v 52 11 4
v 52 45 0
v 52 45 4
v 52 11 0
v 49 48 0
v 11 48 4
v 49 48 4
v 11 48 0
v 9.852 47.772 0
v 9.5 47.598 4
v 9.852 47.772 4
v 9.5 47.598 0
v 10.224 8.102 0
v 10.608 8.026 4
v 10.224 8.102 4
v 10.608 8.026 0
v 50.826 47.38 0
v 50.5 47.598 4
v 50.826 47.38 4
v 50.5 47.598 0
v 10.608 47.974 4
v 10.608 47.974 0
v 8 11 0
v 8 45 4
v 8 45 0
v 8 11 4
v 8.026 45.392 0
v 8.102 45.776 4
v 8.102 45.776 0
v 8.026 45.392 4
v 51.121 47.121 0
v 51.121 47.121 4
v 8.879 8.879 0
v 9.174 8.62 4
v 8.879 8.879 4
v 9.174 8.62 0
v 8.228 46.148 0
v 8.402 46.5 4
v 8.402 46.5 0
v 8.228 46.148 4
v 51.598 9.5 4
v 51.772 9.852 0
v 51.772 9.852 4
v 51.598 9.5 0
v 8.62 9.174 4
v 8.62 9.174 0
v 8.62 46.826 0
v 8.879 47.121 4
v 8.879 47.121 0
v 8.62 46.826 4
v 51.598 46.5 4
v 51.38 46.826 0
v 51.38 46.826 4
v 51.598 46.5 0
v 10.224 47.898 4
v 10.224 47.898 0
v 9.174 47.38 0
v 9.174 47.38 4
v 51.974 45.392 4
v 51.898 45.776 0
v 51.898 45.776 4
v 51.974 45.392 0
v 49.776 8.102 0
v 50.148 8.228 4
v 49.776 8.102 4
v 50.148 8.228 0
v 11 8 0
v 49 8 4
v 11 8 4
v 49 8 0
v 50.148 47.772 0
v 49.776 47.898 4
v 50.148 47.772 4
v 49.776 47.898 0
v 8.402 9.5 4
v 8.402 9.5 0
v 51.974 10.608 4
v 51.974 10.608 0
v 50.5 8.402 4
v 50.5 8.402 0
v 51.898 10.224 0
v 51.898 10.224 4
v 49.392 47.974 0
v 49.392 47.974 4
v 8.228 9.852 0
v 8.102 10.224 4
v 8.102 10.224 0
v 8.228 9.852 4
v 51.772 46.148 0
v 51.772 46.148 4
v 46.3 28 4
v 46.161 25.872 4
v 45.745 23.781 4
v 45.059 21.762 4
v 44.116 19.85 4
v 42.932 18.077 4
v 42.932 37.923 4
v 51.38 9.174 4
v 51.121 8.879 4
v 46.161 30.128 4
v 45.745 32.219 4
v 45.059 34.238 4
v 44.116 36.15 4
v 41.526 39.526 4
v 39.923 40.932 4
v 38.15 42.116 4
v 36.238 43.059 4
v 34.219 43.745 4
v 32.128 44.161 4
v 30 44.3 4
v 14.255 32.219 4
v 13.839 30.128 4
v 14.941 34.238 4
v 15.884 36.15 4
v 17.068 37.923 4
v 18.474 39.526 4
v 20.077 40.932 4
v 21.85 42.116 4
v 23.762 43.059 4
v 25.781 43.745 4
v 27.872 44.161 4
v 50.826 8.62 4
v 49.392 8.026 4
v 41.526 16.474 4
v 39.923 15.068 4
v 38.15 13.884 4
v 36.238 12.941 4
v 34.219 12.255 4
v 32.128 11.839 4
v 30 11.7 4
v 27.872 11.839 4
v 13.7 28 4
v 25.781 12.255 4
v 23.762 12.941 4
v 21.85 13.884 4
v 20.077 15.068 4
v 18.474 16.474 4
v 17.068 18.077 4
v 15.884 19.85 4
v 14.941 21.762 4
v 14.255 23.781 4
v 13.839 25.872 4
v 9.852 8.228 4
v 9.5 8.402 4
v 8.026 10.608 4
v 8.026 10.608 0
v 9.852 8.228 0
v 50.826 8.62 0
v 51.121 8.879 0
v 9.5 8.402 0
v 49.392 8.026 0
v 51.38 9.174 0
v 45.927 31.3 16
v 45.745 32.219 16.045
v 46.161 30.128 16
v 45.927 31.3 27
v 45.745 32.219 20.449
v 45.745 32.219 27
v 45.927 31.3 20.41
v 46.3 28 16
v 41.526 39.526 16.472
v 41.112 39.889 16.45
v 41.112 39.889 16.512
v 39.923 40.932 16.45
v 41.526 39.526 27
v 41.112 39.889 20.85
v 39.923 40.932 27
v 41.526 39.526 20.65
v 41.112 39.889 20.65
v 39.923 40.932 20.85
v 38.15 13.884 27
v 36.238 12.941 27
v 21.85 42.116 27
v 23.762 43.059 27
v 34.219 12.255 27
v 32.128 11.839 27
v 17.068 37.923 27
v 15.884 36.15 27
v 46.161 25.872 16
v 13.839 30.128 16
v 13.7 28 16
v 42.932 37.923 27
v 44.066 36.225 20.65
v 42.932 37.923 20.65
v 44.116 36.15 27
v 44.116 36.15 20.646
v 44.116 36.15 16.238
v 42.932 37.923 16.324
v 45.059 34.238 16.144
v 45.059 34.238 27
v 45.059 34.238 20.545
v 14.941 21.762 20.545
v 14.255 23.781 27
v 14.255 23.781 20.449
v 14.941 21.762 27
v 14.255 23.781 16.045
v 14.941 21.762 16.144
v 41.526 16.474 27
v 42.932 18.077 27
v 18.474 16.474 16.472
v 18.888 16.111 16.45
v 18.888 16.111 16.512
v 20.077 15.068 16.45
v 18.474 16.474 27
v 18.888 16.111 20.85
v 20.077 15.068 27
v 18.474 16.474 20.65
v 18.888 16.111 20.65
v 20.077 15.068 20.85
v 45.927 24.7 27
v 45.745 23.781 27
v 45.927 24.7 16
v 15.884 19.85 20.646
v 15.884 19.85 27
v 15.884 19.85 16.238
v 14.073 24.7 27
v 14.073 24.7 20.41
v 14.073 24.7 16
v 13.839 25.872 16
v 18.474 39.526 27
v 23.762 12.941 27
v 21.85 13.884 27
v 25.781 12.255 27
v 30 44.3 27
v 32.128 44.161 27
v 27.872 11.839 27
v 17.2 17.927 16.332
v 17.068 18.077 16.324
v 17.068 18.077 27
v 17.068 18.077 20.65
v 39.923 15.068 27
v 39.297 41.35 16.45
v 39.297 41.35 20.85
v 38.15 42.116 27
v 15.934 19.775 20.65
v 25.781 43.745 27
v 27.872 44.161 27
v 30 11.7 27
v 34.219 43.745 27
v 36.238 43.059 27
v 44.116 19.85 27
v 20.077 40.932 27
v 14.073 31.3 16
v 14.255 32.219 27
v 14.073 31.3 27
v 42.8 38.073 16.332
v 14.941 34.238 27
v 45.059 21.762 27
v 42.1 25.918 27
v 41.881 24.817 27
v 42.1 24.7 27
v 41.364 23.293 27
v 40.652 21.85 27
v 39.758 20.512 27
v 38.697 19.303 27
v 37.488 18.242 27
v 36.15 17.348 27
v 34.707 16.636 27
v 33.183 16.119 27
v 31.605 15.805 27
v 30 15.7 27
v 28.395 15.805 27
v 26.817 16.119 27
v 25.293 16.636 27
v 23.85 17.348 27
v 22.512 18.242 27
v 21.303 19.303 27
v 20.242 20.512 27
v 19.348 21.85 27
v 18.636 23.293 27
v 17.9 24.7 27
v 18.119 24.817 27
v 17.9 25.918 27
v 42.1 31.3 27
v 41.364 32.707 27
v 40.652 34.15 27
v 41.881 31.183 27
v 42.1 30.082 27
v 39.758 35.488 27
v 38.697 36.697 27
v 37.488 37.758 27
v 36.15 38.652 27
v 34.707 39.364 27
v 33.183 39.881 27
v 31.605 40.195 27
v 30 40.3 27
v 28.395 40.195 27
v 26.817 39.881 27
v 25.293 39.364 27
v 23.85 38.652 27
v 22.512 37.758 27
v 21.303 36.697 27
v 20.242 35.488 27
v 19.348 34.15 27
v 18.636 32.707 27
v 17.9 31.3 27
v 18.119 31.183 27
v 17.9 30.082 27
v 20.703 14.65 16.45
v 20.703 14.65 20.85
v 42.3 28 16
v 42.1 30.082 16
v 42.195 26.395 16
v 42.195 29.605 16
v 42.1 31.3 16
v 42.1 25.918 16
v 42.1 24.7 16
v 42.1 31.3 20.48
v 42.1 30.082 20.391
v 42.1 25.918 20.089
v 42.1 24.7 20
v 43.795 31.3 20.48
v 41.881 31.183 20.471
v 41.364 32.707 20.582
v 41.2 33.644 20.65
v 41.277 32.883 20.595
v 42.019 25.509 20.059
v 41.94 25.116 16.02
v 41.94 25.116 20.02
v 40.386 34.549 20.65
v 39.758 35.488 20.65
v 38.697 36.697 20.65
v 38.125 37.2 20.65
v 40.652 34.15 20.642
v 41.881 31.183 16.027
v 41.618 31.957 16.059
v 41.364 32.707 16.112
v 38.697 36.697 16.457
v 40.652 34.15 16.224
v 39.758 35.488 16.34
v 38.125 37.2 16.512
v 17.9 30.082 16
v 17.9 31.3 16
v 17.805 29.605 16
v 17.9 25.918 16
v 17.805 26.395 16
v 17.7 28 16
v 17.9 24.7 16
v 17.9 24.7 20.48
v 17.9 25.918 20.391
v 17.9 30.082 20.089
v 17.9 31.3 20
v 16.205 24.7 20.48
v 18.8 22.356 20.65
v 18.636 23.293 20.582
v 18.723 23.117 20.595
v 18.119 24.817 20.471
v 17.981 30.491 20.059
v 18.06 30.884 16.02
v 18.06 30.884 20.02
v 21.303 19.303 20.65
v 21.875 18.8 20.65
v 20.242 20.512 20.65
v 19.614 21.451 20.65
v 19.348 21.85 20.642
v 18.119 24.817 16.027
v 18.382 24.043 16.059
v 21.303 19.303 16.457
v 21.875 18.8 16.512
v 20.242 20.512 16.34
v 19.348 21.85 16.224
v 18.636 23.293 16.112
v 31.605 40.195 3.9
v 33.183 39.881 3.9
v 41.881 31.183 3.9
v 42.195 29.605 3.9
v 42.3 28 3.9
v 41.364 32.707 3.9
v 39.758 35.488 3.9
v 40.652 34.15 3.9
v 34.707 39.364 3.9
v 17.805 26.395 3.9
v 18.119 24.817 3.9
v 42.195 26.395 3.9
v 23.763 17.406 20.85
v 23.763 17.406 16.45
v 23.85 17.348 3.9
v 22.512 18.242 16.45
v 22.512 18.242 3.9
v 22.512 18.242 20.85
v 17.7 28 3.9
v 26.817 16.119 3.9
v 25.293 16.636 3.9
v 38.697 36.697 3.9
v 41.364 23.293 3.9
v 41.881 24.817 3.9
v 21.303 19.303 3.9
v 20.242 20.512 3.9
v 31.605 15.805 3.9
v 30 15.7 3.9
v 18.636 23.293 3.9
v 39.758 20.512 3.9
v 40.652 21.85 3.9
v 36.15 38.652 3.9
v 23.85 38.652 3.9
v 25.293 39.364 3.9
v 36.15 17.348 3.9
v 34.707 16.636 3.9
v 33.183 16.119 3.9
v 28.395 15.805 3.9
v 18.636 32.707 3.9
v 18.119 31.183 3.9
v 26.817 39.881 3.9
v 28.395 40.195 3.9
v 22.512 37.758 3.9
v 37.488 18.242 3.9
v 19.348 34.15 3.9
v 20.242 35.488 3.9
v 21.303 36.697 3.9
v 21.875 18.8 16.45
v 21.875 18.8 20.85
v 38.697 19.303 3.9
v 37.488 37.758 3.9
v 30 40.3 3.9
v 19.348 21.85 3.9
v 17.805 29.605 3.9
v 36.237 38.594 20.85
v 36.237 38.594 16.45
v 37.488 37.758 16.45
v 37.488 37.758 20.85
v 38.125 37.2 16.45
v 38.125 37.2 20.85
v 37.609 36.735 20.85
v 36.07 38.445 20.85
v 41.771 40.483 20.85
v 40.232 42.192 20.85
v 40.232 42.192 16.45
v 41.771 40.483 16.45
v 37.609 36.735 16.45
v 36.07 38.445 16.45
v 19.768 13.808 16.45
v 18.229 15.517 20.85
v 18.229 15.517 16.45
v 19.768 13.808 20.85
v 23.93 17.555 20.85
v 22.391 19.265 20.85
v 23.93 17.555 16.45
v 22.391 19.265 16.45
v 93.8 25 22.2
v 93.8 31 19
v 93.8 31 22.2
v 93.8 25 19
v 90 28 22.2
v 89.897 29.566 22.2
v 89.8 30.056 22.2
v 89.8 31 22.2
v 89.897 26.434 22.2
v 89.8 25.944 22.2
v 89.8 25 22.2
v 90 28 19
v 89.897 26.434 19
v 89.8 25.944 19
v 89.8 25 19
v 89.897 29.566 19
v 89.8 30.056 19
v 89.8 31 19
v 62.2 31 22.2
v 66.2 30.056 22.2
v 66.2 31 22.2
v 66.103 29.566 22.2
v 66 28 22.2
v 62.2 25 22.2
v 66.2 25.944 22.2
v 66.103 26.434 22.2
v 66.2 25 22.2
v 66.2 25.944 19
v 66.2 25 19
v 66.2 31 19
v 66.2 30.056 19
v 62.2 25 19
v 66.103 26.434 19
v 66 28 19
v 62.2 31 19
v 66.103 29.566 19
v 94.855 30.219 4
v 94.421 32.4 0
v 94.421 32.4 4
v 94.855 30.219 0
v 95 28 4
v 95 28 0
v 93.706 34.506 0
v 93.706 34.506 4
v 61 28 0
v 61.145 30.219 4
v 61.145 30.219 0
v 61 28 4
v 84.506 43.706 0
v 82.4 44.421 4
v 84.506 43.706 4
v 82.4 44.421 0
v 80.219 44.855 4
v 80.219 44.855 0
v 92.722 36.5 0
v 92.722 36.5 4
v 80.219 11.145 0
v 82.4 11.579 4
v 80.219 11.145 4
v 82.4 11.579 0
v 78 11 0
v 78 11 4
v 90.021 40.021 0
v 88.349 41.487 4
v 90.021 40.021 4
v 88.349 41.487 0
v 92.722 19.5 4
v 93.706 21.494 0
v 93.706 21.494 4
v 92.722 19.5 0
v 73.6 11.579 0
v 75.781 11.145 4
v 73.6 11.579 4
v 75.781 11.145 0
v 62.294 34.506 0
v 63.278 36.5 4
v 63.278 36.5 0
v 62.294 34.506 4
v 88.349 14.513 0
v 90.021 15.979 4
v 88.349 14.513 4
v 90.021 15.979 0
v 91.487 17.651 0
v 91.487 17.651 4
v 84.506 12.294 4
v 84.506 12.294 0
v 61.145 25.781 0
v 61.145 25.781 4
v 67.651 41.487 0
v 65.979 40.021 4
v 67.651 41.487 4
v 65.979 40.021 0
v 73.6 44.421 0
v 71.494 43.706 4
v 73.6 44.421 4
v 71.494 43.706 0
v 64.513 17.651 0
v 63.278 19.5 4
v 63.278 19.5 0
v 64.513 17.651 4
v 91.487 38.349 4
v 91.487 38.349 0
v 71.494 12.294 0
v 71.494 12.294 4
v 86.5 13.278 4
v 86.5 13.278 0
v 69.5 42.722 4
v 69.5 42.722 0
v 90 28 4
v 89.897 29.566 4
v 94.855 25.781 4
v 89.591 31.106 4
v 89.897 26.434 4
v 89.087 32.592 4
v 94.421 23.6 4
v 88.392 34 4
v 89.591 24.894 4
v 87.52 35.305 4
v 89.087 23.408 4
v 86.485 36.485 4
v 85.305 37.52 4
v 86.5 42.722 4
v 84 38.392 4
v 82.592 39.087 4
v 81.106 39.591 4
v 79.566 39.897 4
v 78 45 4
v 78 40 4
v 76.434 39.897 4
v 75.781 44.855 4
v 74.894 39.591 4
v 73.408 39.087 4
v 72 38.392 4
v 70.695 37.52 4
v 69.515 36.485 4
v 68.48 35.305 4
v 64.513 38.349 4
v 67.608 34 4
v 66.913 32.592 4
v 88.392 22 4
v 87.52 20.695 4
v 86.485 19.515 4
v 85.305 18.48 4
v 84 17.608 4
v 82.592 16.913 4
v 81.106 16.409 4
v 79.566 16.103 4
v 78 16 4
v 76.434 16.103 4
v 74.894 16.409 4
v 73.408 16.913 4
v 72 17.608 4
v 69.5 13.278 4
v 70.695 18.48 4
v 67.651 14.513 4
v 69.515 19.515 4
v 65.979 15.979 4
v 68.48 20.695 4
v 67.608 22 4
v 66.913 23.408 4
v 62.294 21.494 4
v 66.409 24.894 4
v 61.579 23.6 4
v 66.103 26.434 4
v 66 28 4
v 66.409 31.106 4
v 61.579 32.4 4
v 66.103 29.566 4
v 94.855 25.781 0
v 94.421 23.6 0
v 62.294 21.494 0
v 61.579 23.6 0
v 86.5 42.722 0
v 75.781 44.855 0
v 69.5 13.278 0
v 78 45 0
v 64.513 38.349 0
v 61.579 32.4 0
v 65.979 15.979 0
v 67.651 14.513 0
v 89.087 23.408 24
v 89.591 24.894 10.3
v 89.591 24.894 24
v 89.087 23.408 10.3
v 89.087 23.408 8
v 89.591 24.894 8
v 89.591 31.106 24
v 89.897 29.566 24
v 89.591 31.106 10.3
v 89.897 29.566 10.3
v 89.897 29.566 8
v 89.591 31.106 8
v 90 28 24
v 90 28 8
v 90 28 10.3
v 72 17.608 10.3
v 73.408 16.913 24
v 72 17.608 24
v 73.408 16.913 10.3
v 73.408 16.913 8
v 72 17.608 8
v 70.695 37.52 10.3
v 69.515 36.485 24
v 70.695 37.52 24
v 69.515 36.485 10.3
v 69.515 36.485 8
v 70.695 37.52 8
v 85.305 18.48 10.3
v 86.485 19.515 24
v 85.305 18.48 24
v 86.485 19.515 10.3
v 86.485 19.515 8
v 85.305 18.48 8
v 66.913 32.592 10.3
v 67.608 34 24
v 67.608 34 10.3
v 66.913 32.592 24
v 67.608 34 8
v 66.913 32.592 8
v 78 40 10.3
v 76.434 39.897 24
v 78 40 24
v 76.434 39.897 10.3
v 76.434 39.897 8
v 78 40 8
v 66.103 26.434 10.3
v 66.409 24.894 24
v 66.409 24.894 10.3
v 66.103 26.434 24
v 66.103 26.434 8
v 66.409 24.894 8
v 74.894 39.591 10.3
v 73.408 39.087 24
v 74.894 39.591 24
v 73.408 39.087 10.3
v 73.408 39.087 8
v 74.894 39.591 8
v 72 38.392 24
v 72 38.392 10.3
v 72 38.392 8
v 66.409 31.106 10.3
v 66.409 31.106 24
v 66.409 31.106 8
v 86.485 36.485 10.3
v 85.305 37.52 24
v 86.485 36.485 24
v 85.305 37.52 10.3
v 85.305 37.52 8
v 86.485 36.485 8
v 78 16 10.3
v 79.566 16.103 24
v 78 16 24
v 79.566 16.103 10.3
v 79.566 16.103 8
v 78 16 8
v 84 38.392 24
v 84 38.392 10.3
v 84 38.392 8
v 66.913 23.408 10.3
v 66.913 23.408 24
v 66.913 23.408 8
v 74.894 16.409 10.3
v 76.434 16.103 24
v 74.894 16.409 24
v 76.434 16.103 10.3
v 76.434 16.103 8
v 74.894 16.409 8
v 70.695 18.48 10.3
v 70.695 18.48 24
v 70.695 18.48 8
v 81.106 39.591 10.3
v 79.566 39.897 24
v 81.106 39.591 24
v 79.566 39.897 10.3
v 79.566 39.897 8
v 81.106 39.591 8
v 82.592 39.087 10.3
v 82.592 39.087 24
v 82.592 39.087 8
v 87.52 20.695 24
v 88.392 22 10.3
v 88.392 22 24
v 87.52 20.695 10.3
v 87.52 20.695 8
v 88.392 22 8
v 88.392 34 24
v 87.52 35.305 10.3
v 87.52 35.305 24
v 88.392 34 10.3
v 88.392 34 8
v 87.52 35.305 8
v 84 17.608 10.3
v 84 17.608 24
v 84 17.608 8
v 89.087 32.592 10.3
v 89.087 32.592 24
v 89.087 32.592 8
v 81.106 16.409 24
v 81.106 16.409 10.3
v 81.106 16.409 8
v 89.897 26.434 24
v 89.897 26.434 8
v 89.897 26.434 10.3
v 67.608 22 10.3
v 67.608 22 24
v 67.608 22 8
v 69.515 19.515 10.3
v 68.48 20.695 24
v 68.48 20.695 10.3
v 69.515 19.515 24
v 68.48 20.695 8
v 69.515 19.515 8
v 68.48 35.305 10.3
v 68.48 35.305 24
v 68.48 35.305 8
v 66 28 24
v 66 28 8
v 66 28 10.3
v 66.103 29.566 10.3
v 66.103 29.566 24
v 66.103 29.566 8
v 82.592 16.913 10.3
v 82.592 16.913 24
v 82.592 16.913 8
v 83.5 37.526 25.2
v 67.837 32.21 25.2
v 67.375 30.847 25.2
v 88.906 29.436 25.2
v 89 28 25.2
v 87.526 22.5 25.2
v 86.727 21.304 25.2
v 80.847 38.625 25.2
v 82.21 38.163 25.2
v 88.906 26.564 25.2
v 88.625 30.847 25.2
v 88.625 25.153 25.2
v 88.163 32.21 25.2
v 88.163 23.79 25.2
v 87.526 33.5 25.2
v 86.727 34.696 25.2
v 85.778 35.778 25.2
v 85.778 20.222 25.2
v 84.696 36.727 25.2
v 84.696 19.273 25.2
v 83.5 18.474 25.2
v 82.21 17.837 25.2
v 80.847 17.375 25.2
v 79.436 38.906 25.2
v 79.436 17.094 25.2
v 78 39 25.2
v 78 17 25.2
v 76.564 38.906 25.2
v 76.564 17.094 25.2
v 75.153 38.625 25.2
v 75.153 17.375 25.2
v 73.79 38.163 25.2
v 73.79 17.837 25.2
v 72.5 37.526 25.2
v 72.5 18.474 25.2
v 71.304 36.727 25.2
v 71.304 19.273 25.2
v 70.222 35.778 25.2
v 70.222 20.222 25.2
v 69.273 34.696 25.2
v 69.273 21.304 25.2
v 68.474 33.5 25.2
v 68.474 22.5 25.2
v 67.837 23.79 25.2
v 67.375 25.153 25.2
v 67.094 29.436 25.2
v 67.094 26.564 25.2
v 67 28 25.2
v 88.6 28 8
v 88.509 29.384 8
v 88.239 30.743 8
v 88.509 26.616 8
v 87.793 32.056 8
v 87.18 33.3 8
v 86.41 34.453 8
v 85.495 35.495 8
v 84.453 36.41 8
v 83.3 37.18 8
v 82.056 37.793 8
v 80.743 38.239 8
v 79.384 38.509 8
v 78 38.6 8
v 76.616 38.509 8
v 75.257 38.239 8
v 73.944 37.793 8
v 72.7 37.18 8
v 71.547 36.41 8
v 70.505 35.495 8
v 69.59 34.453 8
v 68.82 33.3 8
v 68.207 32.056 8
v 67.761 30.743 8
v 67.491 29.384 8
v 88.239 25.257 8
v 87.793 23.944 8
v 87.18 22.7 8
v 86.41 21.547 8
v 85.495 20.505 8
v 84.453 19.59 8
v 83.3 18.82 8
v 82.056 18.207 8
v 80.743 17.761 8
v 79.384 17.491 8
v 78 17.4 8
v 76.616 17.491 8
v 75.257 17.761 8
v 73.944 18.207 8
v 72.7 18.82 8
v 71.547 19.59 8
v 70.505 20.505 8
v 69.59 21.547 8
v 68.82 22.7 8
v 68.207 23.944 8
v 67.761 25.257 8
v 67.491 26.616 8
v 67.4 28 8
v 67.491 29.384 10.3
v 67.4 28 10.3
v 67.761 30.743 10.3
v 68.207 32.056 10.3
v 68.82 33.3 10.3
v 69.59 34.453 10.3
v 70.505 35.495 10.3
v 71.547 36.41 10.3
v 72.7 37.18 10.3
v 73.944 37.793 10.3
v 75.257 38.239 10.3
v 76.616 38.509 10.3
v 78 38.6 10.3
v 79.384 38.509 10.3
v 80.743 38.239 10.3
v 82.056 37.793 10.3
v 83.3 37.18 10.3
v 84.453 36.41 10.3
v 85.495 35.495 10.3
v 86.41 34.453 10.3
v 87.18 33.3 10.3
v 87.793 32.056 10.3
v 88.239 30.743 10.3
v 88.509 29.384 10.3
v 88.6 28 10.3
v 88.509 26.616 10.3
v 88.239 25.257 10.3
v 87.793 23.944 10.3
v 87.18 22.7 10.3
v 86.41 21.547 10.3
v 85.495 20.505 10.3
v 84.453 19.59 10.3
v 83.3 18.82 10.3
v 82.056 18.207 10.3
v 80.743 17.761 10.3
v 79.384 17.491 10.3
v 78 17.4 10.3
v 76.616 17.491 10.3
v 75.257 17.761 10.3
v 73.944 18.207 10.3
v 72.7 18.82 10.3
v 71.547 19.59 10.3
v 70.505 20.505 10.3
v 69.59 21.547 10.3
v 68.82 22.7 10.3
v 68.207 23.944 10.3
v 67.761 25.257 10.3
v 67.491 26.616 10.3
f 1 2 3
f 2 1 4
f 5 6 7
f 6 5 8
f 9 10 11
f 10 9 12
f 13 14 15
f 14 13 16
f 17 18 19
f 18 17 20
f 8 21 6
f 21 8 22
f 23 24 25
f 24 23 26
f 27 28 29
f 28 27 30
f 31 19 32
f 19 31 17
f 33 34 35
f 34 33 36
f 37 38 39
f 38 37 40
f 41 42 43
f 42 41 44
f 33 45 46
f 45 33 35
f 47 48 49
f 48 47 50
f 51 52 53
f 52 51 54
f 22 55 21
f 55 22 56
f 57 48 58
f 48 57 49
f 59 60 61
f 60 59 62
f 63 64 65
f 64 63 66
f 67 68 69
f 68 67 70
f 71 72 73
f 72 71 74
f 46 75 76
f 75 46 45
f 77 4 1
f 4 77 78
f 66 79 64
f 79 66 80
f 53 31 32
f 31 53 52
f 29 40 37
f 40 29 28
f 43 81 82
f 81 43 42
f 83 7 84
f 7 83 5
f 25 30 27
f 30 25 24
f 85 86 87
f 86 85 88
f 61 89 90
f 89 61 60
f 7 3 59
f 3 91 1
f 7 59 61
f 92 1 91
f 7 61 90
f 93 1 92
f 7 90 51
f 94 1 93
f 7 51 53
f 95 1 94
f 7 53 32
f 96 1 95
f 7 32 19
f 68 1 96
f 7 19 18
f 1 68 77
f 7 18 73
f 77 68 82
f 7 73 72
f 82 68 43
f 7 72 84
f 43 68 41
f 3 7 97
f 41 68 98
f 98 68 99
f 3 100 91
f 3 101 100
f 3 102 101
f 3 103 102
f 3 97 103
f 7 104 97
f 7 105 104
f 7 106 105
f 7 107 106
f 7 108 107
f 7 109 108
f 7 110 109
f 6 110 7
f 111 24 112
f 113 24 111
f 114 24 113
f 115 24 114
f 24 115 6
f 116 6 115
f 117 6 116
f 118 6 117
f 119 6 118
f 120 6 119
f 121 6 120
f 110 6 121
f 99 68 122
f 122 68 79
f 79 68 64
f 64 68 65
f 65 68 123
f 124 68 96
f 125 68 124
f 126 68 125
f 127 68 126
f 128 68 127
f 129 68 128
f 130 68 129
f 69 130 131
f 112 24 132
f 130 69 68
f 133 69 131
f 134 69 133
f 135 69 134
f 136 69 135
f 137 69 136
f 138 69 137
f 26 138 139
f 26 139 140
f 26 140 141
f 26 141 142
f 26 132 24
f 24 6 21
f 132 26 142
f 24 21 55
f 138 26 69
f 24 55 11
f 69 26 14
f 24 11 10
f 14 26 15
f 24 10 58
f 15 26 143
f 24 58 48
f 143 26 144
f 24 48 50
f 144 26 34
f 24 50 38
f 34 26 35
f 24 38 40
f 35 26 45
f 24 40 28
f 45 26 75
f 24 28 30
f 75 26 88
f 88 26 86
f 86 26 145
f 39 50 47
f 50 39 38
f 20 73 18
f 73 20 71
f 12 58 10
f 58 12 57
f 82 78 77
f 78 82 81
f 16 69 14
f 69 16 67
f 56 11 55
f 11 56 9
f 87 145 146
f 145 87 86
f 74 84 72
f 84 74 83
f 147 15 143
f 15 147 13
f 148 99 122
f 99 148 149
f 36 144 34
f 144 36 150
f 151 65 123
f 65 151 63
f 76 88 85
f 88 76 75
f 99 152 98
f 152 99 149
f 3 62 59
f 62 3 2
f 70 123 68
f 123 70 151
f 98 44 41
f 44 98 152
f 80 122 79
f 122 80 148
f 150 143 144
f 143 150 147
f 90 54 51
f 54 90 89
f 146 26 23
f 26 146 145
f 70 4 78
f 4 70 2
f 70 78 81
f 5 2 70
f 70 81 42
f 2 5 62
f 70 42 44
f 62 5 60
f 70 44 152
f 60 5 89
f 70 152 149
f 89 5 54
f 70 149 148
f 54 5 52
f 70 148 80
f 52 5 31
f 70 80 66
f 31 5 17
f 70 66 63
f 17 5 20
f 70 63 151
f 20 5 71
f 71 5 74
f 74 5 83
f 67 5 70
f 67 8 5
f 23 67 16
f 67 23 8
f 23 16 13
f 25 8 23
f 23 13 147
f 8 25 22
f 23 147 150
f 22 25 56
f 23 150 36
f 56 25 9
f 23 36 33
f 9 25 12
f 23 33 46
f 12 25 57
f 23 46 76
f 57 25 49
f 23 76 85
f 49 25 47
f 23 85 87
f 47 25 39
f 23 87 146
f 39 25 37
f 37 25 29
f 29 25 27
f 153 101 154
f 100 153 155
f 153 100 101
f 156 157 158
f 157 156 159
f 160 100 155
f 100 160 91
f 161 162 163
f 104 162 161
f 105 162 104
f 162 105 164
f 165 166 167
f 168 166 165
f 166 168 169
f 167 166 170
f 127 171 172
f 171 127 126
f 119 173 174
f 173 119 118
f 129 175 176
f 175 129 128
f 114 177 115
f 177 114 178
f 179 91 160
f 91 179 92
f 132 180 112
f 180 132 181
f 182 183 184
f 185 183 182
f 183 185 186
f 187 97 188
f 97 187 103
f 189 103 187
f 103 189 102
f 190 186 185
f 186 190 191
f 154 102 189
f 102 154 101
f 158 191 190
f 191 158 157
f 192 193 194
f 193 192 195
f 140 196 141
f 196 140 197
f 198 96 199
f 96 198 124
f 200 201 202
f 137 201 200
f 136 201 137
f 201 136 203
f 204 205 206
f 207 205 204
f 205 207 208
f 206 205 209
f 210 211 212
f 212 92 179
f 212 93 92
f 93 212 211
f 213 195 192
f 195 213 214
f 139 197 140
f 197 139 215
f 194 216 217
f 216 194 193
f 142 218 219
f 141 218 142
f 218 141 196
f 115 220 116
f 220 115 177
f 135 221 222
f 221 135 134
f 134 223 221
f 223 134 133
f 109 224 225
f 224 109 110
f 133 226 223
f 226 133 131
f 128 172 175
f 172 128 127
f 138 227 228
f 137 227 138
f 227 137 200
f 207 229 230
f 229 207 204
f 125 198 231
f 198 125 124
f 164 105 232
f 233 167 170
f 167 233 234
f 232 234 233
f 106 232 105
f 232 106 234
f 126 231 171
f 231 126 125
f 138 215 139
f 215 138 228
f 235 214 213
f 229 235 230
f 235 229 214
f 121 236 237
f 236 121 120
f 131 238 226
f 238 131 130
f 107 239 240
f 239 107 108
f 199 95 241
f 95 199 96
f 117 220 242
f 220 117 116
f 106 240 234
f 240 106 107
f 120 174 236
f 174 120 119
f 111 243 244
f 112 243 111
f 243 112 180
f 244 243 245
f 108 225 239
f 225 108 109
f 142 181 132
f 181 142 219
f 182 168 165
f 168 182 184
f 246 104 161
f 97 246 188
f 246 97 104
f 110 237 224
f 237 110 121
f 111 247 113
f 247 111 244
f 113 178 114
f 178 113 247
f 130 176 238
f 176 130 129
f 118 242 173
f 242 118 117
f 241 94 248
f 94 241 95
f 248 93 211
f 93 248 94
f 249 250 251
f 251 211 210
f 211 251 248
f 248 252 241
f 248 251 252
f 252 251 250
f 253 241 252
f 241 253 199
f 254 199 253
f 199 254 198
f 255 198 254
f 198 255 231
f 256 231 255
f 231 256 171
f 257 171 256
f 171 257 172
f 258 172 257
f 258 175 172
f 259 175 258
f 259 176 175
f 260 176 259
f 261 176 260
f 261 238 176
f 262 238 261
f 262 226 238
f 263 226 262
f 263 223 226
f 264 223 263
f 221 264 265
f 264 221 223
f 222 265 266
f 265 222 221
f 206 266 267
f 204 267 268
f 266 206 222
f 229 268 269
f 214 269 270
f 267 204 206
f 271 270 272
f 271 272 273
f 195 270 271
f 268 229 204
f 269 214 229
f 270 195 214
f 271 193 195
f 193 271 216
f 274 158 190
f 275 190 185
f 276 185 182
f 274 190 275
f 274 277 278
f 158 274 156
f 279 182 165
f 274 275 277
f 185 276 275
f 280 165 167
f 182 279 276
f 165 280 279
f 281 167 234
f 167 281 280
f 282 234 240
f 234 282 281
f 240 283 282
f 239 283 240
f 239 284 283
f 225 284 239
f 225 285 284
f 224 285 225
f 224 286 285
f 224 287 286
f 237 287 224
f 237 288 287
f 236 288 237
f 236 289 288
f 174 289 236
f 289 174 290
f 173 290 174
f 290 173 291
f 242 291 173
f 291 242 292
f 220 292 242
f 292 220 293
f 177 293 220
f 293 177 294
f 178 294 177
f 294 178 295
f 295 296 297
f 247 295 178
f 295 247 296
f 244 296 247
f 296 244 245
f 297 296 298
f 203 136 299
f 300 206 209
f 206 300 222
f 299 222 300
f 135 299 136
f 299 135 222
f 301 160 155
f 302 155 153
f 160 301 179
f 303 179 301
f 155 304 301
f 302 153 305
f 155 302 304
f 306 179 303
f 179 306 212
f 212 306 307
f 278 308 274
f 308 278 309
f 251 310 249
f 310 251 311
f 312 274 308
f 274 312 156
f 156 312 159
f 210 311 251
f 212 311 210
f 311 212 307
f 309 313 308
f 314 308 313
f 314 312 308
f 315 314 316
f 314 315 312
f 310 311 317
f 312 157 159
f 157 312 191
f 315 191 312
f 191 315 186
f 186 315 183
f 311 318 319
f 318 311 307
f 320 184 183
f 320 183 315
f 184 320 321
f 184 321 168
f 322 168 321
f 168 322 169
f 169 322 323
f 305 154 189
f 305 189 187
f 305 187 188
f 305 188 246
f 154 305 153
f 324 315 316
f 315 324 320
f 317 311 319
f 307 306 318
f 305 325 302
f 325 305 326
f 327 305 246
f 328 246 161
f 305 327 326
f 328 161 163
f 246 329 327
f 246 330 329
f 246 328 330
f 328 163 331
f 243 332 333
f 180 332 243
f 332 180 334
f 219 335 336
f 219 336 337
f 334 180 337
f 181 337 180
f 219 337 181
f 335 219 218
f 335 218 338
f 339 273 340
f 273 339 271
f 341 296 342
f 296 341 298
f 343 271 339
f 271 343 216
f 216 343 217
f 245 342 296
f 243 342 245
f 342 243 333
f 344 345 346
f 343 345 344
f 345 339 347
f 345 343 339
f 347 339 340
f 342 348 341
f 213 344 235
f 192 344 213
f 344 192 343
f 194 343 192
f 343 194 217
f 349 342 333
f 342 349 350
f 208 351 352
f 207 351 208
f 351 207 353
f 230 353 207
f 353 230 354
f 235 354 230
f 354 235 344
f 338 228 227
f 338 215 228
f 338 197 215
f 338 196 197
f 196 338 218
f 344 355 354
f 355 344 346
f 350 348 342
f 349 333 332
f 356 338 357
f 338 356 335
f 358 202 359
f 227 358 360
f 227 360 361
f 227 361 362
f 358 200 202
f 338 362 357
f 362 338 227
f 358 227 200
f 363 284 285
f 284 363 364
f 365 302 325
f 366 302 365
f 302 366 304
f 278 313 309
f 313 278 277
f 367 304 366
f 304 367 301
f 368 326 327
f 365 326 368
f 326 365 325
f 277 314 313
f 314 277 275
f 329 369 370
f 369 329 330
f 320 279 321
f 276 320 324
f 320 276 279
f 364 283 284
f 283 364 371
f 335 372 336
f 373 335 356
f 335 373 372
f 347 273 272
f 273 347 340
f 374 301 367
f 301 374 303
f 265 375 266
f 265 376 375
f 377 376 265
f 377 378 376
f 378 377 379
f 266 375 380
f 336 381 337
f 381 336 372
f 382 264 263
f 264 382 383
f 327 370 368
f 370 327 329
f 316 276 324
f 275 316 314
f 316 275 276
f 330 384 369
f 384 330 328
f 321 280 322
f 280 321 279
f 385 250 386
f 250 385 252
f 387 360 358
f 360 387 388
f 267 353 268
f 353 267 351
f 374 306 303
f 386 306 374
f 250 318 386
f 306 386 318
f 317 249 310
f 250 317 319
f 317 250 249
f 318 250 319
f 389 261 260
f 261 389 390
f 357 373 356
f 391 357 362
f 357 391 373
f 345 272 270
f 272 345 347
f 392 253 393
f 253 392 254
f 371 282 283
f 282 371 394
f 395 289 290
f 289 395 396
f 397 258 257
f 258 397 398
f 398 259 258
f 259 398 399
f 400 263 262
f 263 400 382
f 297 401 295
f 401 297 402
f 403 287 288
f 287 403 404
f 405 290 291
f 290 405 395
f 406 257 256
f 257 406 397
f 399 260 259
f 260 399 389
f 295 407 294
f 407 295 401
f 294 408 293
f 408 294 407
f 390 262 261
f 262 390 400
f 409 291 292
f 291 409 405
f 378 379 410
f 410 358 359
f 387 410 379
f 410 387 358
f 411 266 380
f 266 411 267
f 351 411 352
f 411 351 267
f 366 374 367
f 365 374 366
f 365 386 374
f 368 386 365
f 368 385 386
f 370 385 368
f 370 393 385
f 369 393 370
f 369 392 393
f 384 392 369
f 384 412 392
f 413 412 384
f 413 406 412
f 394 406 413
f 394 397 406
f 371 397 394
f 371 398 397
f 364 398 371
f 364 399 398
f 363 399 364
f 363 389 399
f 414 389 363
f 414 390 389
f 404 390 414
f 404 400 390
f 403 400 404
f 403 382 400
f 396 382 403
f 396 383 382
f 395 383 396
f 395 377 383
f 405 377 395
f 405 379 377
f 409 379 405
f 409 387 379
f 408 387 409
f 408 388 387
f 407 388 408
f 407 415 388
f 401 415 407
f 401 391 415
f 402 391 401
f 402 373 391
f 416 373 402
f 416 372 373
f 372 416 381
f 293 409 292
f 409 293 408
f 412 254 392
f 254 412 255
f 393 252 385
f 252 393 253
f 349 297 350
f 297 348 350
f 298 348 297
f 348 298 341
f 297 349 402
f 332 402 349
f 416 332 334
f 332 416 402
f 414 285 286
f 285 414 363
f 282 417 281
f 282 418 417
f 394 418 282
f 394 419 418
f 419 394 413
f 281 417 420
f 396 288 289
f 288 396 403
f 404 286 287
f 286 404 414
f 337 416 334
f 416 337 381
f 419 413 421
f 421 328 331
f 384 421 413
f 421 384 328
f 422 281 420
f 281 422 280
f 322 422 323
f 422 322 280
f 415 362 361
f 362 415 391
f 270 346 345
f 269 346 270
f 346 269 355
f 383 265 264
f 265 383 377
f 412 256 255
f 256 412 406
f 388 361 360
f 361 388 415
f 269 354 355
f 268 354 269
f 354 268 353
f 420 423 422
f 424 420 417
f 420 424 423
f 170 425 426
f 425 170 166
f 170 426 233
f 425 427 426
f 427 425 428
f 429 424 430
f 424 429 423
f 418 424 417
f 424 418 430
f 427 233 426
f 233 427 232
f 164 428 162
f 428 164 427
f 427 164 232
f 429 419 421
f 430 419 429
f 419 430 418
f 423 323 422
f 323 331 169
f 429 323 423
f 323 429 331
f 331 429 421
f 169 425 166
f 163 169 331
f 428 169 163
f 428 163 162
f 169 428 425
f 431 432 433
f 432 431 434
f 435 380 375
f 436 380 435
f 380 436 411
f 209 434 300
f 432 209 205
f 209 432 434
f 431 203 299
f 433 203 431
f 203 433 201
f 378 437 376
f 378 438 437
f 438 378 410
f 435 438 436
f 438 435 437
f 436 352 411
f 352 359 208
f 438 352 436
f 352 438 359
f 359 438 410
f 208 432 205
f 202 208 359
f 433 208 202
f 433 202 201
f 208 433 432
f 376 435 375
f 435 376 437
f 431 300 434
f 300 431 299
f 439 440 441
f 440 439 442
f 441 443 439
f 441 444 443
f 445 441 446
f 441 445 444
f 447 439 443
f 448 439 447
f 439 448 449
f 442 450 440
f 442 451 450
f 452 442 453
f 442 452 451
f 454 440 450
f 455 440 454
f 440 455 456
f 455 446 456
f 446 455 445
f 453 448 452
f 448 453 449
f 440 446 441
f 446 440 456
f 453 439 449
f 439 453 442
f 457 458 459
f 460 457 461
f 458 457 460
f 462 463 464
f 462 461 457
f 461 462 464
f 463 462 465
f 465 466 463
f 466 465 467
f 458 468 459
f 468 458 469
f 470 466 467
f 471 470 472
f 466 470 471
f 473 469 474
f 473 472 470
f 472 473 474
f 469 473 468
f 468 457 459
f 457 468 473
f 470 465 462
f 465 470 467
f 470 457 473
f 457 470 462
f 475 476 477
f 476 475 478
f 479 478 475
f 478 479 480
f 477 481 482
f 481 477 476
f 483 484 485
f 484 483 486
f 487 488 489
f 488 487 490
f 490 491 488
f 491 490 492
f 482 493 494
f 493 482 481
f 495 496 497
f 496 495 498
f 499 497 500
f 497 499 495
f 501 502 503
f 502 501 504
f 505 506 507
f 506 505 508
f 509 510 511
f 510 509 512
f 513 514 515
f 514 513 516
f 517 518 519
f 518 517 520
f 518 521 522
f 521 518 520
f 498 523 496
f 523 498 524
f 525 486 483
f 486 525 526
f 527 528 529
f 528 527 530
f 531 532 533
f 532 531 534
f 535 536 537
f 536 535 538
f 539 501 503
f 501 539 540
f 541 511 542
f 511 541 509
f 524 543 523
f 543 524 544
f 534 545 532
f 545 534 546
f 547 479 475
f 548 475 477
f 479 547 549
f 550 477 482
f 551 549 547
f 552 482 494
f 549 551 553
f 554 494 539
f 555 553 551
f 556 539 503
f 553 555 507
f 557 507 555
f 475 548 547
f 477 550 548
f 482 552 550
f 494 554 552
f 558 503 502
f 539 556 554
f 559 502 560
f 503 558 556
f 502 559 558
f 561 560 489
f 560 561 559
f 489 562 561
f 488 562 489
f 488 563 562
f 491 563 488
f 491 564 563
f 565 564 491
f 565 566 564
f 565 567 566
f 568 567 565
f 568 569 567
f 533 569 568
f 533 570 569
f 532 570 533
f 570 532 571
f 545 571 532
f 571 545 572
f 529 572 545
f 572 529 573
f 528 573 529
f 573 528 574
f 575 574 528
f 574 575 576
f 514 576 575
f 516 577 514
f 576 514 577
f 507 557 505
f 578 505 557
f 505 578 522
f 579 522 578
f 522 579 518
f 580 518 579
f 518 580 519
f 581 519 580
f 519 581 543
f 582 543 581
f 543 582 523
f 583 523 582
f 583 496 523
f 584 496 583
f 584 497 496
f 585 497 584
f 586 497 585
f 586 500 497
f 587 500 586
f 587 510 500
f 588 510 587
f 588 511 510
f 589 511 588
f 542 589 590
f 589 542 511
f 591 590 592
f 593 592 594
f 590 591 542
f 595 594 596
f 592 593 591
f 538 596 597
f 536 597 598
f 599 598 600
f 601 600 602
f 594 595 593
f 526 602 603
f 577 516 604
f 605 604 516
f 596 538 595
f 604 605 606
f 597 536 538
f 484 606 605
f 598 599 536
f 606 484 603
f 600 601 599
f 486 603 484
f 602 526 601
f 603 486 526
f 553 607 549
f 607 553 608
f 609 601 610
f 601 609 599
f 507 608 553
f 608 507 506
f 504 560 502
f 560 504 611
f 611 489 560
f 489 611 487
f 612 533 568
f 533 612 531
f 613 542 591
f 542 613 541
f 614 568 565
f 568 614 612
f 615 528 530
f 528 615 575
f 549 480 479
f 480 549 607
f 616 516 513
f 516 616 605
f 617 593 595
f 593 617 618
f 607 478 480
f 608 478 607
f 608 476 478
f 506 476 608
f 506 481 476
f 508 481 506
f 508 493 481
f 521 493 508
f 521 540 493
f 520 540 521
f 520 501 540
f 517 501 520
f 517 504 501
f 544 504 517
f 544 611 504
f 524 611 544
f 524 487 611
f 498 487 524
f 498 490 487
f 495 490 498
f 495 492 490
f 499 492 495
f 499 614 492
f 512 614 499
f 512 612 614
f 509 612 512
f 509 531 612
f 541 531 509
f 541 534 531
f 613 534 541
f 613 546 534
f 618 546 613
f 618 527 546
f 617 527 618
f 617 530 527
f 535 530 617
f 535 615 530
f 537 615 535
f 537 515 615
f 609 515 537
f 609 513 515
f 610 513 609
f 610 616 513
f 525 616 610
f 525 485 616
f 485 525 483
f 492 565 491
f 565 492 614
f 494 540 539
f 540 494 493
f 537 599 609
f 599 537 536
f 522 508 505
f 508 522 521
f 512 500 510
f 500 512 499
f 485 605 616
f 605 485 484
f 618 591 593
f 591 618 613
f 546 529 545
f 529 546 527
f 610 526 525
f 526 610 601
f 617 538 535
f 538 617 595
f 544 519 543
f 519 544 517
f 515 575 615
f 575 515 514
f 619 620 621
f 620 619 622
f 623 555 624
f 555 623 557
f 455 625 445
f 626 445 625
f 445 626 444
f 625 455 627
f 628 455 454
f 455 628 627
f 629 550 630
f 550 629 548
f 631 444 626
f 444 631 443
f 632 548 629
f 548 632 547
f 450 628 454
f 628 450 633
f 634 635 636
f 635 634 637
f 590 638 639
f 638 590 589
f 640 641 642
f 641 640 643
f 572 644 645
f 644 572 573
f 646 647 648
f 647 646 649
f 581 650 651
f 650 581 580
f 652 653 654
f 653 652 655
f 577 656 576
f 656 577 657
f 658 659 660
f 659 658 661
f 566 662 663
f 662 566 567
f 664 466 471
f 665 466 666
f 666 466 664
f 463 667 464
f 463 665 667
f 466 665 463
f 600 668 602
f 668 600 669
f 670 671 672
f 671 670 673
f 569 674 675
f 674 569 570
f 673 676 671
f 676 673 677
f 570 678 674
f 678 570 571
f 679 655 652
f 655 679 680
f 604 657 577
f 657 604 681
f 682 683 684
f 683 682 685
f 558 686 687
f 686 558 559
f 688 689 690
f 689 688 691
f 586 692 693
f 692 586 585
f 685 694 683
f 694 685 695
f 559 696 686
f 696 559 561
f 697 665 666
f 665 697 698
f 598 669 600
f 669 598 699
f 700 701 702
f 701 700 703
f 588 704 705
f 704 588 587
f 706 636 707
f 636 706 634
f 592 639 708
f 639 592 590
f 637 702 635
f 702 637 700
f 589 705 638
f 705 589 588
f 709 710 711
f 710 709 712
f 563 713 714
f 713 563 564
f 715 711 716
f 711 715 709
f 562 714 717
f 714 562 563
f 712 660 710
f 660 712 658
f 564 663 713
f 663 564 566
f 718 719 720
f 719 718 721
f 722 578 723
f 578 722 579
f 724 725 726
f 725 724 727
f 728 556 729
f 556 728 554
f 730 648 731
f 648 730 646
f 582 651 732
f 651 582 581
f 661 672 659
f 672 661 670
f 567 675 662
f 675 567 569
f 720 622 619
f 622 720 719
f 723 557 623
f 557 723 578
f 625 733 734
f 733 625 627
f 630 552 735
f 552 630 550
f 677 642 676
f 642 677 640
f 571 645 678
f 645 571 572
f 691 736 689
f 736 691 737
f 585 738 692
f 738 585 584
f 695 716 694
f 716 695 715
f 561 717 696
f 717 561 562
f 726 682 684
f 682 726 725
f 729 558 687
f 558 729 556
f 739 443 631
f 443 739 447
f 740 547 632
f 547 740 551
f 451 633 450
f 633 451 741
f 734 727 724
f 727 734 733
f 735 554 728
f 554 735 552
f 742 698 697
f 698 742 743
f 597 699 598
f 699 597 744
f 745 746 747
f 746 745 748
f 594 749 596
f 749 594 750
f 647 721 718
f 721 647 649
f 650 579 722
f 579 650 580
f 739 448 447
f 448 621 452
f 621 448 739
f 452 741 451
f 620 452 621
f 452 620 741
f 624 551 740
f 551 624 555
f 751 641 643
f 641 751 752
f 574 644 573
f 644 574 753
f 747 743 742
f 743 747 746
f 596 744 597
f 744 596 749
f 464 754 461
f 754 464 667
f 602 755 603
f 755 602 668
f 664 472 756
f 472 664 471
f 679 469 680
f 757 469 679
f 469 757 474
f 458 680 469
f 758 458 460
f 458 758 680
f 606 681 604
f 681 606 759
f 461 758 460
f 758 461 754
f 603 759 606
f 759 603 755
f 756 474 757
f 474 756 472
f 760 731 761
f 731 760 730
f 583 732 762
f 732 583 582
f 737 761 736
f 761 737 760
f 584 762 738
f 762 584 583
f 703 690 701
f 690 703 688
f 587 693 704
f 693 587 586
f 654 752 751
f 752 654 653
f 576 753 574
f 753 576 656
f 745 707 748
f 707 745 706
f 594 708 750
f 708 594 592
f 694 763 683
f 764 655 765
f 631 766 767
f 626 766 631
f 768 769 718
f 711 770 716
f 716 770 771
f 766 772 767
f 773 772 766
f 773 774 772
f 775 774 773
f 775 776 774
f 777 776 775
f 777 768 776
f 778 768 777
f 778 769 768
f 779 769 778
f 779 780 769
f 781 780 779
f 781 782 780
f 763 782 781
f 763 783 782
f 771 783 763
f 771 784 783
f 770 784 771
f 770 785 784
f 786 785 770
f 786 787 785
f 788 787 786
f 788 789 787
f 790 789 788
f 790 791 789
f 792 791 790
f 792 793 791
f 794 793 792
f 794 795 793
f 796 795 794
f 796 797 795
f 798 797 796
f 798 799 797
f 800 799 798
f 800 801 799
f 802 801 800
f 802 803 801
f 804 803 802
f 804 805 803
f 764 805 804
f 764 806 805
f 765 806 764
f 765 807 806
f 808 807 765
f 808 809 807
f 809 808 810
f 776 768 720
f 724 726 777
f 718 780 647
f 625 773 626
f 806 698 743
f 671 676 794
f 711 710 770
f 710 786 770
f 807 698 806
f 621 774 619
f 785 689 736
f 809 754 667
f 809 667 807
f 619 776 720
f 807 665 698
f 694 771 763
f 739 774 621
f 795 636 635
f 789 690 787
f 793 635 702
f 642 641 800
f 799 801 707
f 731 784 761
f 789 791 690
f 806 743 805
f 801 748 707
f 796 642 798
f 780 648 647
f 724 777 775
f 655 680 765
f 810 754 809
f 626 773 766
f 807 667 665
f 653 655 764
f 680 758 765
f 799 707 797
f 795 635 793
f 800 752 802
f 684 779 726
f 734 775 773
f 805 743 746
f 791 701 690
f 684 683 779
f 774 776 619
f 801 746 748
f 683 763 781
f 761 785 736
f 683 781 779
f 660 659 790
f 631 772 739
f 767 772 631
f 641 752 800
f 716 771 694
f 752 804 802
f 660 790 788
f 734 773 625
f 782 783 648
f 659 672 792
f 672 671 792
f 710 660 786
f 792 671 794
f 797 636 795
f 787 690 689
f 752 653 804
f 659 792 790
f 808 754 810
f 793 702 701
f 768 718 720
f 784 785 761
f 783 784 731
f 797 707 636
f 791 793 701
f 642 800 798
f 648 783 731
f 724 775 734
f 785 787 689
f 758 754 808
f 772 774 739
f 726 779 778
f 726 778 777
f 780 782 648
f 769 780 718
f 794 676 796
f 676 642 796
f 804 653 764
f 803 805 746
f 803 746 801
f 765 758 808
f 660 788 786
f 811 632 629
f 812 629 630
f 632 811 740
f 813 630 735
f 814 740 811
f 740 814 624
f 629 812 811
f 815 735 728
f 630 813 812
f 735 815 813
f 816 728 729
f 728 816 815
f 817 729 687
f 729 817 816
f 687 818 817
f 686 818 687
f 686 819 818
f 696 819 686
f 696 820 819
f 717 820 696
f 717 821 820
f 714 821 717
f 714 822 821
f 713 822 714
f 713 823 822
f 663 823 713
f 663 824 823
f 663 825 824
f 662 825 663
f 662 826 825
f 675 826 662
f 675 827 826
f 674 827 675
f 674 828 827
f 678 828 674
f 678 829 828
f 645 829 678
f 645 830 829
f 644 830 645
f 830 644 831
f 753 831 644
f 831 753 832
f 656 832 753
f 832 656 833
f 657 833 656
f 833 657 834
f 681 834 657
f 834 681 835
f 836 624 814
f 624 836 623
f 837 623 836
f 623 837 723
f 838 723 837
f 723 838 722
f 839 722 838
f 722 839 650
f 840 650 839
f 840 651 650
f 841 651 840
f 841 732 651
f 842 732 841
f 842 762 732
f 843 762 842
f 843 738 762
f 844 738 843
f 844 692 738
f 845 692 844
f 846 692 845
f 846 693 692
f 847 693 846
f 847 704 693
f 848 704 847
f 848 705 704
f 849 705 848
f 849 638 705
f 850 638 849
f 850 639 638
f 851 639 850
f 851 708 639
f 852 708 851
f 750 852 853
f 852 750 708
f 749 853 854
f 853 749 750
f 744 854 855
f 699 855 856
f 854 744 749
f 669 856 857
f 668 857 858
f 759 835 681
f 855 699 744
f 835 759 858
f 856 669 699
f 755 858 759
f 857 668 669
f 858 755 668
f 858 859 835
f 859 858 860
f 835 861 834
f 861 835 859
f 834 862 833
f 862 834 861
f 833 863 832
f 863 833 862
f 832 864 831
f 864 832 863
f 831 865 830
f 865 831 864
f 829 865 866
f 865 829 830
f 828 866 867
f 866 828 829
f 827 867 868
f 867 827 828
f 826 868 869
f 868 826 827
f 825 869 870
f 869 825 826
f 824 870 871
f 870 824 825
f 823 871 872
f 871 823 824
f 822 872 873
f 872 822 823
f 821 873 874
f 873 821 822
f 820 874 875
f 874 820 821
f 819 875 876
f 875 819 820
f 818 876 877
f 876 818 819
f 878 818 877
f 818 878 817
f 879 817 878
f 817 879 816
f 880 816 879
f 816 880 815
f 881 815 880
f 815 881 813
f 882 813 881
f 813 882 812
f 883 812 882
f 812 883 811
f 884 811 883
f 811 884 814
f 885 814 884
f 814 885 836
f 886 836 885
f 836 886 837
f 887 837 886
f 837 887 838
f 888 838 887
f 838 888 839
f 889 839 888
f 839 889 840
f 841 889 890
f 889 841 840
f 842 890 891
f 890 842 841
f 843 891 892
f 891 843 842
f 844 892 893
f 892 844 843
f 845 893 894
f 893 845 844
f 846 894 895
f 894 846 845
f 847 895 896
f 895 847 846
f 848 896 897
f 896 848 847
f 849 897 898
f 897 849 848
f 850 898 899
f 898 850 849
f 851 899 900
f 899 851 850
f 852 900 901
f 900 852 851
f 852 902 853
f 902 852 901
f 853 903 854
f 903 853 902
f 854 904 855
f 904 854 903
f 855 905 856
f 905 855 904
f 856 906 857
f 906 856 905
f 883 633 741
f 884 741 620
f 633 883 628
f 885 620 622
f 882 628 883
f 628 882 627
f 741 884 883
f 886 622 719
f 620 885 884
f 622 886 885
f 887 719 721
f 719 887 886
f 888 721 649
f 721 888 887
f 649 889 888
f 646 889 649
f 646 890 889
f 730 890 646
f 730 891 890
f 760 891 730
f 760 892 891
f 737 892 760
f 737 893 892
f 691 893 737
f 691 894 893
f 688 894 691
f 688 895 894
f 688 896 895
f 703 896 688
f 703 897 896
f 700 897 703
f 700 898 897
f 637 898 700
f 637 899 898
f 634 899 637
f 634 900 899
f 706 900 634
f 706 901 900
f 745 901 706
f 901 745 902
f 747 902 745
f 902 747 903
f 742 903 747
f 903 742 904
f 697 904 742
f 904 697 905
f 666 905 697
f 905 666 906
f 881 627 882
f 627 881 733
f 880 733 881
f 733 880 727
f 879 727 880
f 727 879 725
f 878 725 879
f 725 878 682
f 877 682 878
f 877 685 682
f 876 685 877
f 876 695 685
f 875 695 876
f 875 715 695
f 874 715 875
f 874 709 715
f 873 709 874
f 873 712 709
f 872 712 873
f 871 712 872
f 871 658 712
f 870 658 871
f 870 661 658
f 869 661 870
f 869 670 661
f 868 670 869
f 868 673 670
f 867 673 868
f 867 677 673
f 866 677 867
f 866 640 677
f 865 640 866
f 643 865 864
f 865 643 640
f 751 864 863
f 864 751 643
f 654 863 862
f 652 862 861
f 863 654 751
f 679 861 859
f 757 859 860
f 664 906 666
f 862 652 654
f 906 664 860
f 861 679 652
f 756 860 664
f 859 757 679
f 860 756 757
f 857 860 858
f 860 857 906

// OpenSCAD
/*
Sample 126: O-Ring-vorgespanntes Rampenbajonett — 15 % radiale Kompression
Generated from the FDM Mechanical Sample Library.
Units: millimetres.

Override examples:
  openscad -o custom.stl -D 'view="plate"' -D 'render_fn=64' model.scad
  openscad -o preview.png -D 'view="assembly"' model.scad
*/
use <../../../library/fdm_mechanisms.scad>

render_fn = is_undef(render_fn) ? 48 : render_fn;
view = is_undef(view) ? "plate" : view;
$fn = render_fn;

sample_ramped_bayonet(
    view=view,
    core_d=24,
    running_clearance=0.3,
    lug_w=6,
    ramp_h=0.65,
    turn_deg=42,
    oring_id=21,
    oring_cs=2,
    radial_squeeze=0.15,
    hard_stop=1.5
);
